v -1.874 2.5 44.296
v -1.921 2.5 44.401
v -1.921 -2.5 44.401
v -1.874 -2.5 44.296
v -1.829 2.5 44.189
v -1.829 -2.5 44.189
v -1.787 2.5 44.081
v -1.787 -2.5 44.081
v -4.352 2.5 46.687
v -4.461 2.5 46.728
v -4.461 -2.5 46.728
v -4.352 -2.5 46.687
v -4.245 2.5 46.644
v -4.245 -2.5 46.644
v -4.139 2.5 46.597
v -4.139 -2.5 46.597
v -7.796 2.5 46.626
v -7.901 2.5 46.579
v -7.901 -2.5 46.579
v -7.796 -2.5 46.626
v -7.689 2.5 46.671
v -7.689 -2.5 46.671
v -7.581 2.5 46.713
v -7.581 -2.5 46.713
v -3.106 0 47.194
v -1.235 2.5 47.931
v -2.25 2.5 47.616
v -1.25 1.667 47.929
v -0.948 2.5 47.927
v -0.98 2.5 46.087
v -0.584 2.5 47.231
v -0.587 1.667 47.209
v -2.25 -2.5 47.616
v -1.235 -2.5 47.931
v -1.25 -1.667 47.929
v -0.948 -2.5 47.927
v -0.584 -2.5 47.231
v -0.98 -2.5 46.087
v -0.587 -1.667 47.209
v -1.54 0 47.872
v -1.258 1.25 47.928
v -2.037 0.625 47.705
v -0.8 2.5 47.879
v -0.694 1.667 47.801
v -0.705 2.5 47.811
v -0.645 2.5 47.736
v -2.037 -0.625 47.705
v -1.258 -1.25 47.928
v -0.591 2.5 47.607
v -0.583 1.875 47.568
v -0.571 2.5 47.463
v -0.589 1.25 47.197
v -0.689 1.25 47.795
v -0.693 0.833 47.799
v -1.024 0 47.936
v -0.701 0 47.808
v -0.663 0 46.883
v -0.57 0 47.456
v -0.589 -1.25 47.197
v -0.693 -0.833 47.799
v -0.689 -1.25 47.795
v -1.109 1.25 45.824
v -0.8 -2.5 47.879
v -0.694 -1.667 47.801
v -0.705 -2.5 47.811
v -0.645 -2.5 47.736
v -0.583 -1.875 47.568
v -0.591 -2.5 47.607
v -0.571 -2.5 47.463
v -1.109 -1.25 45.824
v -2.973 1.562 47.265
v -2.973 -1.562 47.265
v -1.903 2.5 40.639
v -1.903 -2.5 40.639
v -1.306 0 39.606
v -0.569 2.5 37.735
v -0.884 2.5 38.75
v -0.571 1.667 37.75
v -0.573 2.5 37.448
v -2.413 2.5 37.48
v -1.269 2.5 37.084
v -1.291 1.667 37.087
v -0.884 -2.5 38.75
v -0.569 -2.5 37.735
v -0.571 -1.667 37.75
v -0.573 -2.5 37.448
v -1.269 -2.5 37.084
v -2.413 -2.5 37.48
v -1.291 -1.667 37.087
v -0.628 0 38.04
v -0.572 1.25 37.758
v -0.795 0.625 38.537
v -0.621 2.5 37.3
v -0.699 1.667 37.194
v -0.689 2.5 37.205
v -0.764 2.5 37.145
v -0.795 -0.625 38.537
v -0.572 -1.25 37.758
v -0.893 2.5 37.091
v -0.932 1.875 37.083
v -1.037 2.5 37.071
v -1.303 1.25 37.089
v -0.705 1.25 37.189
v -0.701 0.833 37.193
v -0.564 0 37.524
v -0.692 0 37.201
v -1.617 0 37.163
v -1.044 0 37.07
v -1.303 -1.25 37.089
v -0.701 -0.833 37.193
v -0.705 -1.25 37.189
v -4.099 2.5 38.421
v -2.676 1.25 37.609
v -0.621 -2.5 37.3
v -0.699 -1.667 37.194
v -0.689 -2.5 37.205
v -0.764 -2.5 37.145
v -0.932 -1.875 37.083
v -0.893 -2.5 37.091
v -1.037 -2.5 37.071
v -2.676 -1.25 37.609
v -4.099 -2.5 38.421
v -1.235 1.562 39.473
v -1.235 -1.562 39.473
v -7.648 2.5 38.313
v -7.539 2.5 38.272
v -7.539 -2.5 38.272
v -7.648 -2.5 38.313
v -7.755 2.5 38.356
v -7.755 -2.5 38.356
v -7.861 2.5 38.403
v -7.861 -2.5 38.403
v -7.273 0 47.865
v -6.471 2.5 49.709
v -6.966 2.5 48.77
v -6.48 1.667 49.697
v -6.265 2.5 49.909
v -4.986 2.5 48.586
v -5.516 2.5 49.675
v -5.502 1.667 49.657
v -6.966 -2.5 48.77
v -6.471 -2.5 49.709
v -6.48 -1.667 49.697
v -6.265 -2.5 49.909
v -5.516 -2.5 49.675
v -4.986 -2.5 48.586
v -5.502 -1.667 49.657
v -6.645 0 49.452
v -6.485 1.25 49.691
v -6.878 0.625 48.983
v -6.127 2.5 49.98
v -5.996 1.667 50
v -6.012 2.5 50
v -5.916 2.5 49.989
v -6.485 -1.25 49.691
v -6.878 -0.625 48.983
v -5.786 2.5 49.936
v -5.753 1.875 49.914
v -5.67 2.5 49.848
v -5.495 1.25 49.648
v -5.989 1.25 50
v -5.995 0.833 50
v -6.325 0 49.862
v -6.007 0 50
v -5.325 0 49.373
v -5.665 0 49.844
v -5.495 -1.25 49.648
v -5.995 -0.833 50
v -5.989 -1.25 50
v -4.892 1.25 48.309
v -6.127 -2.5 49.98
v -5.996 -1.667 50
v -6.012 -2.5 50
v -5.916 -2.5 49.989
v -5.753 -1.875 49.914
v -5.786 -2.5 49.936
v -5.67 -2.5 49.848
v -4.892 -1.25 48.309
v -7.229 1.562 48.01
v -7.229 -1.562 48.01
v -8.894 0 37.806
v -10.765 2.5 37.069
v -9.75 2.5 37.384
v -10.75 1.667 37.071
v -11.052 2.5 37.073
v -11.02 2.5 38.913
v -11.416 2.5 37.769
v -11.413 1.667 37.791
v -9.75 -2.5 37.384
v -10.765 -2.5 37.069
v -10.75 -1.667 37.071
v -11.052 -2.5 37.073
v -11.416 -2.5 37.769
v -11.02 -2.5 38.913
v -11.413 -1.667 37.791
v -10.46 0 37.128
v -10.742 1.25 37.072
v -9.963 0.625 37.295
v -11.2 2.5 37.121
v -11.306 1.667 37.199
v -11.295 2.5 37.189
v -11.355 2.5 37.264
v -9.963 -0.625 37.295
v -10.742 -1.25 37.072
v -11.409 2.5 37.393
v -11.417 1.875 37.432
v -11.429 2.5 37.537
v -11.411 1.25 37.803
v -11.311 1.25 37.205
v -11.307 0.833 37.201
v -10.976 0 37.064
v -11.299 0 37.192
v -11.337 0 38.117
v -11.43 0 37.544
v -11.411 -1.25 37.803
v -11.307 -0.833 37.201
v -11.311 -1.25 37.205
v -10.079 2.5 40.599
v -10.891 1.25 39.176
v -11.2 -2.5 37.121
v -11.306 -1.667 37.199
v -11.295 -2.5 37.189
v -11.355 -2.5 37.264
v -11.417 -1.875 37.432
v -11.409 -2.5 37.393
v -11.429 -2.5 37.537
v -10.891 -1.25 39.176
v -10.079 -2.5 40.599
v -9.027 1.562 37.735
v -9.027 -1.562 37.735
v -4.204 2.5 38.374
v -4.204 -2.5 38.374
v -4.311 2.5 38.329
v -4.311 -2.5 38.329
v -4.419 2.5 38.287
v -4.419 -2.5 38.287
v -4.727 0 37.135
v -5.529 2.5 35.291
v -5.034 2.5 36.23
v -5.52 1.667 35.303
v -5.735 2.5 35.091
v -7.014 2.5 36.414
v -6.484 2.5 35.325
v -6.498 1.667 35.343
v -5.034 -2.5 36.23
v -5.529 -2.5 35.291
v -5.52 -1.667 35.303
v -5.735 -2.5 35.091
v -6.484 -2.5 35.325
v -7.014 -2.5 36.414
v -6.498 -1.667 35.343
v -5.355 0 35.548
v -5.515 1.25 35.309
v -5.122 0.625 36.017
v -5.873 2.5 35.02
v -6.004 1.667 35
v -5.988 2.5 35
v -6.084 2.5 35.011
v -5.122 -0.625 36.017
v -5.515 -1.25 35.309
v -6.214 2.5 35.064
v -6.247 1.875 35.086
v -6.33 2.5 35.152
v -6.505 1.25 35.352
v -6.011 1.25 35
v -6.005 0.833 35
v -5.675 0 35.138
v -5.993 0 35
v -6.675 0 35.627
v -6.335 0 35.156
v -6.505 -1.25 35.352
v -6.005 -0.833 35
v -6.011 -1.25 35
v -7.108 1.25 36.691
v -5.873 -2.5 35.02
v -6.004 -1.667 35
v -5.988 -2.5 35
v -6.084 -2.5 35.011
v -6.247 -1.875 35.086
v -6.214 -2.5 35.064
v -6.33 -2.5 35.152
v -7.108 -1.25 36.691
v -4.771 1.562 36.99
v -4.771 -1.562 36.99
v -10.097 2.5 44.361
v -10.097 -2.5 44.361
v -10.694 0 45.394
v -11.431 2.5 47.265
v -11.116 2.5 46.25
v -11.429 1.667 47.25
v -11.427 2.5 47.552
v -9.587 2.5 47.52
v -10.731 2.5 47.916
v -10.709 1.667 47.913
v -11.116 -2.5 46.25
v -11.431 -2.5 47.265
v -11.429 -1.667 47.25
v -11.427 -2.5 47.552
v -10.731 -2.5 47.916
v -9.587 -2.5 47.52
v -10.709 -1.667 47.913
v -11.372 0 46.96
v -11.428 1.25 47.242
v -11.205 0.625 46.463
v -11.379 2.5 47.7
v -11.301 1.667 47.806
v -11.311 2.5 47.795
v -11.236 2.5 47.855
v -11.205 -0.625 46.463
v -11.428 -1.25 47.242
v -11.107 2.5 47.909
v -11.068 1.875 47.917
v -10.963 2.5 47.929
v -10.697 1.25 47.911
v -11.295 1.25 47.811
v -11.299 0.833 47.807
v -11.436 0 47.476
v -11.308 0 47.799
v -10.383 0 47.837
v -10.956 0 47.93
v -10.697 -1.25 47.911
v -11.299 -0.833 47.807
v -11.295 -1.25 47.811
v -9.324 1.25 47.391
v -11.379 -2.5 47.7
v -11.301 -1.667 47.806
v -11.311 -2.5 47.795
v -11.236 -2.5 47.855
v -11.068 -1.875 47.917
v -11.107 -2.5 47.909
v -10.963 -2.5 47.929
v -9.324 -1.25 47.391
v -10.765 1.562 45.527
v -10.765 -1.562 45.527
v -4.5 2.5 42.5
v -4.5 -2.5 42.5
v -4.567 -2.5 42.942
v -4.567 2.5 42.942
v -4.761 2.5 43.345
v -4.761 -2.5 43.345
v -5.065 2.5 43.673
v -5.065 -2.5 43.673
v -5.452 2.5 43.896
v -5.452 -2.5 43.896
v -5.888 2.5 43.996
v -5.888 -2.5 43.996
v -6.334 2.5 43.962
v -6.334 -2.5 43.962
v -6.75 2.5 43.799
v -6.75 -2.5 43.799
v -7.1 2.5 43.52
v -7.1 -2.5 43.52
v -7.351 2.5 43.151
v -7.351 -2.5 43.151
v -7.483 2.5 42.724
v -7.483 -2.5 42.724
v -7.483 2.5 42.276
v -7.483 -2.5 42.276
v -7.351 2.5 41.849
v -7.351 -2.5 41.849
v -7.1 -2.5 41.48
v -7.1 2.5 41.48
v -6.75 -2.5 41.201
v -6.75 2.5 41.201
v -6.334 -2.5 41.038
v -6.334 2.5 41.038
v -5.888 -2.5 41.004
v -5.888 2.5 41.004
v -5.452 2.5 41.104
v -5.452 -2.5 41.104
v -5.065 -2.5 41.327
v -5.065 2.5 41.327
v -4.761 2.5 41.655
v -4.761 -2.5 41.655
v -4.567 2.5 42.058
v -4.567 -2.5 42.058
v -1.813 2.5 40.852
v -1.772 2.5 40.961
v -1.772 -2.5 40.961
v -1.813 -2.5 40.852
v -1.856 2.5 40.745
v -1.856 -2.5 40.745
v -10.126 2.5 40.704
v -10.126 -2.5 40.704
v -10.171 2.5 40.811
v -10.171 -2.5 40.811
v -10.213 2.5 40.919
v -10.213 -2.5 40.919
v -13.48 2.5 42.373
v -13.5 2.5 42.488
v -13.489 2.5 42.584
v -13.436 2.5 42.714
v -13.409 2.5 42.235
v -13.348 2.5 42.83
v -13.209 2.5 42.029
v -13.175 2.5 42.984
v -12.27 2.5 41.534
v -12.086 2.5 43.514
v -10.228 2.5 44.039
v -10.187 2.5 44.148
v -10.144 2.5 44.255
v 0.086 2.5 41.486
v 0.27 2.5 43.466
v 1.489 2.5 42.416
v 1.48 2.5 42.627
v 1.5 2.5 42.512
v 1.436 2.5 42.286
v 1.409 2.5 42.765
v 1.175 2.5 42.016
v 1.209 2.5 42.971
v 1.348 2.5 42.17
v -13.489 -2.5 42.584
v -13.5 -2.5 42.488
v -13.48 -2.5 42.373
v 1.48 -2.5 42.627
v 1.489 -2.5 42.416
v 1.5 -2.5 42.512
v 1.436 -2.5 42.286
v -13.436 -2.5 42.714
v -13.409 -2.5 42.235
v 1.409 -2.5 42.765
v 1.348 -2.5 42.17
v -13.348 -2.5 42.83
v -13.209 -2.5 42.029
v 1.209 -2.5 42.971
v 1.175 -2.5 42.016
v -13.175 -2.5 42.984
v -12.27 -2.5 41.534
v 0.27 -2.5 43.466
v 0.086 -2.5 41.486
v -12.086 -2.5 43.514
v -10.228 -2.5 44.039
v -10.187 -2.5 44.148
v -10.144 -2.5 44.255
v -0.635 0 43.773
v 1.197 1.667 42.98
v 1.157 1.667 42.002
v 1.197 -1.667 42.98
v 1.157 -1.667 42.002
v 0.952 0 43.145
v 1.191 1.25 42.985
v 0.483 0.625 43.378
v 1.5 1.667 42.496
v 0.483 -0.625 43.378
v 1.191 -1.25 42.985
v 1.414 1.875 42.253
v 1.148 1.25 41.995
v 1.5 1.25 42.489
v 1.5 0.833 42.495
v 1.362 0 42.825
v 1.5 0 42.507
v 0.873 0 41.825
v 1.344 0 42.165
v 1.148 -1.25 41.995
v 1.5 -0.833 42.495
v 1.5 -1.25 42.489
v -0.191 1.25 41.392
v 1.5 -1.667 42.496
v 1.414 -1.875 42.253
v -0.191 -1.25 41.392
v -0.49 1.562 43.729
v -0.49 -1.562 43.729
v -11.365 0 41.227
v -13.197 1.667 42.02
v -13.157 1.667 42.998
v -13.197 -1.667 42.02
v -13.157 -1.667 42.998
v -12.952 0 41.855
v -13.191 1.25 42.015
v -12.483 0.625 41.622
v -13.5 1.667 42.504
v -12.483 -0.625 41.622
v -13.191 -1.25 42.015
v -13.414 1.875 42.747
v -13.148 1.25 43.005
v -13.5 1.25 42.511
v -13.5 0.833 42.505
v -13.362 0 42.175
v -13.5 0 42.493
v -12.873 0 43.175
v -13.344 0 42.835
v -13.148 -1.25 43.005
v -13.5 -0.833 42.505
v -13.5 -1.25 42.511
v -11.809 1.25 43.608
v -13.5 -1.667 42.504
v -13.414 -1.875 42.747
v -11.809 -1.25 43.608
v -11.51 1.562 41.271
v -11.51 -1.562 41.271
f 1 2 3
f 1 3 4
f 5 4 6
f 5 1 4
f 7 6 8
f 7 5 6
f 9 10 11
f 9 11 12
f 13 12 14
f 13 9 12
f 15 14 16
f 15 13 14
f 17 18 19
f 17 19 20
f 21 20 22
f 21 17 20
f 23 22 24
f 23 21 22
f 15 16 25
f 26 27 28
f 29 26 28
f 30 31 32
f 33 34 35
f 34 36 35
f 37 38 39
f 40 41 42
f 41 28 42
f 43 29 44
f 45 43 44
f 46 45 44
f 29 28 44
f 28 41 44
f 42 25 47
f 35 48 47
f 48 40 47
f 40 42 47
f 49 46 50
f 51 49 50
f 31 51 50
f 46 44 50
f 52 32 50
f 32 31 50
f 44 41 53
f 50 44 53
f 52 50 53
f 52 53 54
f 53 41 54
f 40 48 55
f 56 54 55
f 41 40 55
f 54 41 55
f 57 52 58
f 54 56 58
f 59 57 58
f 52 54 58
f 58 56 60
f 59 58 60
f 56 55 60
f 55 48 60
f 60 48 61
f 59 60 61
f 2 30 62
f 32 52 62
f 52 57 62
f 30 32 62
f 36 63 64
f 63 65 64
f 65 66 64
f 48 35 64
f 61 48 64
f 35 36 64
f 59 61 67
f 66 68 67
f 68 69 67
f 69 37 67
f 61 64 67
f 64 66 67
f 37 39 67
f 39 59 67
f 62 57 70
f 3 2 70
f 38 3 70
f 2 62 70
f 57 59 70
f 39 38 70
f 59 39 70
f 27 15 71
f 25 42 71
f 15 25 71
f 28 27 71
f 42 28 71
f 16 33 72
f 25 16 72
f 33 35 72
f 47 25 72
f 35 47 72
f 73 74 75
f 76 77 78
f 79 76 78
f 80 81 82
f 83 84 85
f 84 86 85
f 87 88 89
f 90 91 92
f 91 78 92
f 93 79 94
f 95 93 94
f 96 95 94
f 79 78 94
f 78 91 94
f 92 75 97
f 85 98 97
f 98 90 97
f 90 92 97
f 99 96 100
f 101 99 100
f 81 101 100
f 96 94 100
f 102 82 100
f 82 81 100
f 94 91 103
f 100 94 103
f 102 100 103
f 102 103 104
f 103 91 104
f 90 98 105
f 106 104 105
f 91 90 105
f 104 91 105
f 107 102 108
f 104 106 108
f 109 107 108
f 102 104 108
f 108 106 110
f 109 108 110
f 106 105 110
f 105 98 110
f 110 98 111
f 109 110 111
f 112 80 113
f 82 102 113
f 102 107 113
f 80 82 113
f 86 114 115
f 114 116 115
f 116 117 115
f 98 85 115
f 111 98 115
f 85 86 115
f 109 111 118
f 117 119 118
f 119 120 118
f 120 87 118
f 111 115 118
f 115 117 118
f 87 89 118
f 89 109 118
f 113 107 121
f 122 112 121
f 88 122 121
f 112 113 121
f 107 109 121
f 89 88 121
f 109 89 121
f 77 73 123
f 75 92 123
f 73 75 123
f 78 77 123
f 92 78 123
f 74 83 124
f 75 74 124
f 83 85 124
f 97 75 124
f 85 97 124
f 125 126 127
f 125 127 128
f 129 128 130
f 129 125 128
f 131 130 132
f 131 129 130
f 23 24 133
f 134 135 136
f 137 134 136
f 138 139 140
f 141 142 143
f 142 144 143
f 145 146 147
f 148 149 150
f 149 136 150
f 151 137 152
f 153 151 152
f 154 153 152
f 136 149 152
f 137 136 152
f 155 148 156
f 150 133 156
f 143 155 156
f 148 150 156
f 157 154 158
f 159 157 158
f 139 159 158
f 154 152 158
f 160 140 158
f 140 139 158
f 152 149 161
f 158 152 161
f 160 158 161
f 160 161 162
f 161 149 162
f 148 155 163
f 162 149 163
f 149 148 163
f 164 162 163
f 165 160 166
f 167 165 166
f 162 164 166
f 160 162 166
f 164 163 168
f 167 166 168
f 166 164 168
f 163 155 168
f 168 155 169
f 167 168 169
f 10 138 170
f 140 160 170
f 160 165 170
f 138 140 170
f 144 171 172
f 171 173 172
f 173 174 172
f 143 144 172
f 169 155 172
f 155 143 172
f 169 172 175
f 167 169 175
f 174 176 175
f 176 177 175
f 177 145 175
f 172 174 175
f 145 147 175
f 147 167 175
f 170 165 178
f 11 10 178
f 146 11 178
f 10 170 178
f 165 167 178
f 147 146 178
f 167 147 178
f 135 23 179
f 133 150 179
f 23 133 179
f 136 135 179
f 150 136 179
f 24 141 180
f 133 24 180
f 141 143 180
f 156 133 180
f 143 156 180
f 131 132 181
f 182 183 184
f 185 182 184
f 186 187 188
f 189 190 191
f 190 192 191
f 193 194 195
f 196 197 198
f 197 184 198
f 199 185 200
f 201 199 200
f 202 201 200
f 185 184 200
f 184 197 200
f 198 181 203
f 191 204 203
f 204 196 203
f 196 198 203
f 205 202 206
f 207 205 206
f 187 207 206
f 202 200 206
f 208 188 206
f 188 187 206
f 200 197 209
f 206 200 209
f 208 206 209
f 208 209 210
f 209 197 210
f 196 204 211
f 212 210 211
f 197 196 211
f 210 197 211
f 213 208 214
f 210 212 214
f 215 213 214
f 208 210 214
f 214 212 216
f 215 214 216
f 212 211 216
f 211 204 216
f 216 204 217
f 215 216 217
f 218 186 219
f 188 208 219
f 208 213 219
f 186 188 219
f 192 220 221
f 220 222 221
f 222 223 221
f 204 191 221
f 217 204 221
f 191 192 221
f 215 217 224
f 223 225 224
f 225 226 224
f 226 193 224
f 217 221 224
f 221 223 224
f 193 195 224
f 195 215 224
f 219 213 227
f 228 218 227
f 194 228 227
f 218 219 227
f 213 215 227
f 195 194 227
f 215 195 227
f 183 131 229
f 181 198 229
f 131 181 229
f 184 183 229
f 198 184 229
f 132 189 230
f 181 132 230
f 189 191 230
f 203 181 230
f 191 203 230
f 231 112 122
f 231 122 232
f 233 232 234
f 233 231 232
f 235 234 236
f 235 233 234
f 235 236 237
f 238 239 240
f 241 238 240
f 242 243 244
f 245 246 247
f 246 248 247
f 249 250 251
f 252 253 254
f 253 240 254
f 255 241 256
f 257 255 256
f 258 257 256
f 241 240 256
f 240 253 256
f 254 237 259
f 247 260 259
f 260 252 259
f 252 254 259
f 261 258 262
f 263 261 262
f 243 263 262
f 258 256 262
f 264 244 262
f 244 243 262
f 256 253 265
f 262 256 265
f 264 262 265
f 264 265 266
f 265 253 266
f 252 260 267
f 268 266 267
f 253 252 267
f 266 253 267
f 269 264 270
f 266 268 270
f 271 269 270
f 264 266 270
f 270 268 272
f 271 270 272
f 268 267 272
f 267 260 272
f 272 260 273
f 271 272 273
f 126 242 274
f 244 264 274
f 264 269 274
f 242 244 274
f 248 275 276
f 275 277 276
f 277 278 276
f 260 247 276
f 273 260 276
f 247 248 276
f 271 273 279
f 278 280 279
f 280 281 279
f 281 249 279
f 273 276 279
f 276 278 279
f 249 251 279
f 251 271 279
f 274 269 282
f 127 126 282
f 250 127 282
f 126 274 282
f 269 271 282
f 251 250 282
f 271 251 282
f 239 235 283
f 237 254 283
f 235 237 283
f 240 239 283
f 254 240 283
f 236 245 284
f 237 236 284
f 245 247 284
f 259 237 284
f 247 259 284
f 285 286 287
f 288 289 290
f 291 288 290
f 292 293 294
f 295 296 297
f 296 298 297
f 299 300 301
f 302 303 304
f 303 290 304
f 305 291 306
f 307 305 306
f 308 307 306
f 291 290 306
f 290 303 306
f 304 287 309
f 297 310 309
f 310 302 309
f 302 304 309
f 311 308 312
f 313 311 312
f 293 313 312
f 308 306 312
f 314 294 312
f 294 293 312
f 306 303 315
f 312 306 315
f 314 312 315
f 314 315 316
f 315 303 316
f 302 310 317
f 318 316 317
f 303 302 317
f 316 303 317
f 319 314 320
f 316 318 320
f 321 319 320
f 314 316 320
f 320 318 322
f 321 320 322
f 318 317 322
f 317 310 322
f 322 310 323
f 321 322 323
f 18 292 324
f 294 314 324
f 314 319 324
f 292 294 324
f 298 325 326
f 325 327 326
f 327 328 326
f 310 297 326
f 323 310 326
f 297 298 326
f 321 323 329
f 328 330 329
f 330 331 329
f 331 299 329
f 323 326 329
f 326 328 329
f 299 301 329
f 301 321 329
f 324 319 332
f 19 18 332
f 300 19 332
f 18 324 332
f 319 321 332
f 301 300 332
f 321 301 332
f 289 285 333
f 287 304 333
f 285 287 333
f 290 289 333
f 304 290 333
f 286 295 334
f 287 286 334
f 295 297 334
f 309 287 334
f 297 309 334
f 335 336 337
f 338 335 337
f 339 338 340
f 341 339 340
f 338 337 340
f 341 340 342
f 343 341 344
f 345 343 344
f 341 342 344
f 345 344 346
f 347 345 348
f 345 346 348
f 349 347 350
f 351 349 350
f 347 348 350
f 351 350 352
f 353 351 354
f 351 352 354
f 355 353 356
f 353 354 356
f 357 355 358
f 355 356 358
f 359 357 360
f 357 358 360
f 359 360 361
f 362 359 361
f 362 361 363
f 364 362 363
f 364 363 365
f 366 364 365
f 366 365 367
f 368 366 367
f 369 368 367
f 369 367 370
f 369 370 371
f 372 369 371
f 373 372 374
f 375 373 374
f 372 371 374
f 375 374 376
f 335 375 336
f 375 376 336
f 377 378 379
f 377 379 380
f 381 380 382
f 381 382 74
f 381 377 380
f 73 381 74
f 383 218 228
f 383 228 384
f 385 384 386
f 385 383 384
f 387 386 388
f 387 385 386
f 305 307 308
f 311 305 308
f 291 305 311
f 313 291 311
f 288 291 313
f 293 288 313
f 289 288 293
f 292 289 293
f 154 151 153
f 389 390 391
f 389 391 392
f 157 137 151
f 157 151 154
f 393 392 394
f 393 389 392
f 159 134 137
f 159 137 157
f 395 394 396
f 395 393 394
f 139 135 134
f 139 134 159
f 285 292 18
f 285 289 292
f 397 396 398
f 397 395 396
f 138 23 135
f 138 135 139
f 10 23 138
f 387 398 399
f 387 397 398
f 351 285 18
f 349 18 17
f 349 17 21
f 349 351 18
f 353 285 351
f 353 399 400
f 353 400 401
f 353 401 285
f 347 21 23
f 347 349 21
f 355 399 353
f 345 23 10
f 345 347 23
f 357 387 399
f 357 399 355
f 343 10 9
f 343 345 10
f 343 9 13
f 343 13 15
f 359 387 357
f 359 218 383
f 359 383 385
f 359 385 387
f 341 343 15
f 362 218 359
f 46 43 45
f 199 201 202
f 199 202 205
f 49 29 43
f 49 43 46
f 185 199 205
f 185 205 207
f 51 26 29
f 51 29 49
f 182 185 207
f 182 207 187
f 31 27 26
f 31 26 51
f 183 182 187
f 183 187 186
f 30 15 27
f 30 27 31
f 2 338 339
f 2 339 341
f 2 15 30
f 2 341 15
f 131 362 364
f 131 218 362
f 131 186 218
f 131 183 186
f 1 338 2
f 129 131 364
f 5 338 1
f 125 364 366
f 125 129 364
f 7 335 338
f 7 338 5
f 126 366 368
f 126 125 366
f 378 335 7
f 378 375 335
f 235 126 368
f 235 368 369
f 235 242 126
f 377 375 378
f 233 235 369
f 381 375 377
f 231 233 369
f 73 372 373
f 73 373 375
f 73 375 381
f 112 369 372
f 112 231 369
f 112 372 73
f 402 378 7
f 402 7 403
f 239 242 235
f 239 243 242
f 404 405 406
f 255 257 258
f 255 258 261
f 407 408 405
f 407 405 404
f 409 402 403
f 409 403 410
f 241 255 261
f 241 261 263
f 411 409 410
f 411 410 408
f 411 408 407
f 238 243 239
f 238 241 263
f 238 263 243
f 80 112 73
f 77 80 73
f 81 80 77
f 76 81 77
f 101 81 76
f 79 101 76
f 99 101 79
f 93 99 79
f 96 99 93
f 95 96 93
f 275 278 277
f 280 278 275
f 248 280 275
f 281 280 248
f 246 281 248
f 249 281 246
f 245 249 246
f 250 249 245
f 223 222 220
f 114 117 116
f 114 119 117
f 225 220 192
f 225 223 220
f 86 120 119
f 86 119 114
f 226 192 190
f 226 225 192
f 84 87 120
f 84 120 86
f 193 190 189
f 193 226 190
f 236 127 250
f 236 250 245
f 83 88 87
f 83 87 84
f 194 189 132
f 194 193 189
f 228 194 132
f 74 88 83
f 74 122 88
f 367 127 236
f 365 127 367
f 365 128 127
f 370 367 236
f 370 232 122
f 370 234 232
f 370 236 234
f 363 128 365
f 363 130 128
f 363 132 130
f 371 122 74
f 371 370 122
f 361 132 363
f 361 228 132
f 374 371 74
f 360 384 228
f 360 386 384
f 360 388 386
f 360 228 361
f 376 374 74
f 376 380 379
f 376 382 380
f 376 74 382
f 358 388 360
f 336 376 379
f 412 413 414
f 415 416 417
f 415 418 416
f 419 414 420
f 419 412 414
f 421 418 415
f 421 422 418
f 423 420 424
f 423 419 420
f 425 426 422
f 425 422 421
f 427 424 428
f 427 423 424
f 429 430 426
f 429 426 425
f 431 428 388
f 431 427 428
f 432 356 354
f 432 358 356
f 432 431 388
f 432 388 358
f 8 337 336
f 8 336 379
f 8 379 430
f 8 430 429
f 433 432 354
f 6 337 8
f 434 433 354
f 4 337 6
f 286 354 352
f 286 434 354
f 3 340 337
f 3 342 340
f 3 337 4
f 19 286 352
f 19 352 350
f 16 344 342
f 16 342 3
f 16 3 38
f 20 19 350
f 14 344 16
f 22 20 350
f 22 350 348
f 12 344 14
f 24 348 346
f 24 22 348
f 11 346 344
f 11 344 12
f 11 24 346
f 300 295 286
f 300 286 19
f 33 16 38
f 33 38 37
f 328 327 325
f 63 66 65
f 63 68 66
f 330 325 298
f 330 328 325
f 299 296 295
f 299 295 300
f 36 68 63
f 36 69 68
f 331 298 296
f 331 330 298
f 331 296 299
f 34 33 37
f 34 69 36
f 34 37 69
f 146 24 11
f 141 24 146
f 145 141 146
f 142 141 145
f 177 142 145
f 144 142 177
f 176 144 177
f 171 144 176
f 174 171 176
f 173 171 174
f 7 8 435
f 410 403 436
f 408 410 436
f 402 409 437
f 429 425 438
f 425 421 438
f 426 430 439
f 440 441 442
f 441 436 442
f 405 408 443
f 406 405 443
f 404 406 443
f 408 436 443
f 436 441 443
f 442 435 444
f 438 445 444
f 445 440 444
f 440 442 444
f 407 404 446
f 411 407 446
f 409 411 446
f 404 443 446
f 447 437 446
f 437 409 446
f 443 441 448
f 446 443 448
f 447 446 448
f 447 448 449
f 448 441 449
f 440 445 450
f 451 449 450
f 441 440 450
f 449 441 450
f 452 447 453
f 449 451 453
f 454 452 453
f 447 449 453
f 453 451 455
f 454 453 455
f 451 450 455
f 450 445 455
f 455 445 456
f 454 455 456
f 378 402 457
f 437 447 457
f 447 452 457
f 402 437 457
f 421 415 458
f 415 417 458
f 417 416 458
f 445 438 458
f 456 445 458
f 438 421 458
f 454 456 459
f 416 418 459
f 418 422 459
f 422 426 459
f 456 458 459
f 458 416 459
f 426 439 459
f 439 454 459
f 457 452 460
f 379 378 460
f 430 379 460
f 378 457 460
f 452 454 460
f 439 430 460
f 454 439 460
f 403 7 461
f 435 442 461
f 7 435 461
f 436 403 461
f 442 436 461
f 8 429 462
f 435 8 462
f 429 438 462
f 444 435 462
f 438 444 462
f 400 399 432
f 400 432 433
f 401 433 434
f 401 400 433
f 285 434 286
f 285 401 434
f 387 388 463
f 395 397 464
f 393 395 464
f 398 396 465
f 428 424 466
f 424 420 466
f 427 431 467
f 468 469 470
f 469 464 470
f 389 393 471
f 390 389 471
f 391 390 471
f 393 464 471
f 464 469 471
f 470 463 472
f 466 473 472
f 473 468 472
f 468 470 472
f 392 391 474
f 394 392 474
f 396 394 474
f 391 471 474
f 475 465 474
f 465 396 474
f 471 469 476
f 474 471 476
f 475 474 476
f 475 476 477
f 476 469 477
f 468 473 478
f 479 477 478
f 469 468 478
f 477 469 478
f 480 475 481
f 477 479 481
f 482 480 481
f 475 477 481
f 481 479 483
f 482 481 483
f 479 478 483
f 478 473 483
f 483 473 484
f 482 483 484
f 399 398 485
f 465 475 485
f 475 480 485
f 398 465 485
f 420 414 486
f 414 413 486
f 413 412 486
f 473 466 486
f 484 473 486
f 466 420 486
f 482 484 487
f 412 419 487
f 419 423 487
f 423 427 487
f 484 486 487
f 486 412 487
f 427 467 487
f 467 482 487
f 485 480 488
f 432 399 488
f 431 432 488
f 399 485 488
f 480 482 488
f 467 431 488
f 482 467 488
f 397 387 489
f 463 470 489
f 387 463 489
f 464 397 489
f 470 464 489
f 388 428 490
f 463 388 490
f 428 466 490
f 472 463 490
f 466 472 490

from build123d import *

# Parameters (mm, degrees)
SKETCH3_R           = 4.5
BOSS_EXTRUDE2_DEPTH = 2.5
BOSS_EXTRUDE3_DEPTH = 5
CIRPATTERN1_COUNT   = 8
SKETCH7_R           = 1.5
CUT_EXTRUDE1_DEPTH  = 5


with BuildPart() as part:
    # Sketch3 → Boss-Extrude2 (new body, symmetric)
    with BuildSketch(Plane(origin=(0, 0, 0), x_dir=(1, 0, 0), z_dir=(0, 1, 0))):
        with Locations((-6, -42.5)):
            Circle(SKETCH3_R)
    extrude(amount=BOSS_EXTRUDE2_DEPTH, both=True)

    # Sketch5 → Boss-Extrude3 (add, through all)
    with BuildSketch(Plane.XZ.offset(2.5)):
        with BuildLine():
            Line((-7.58091961, 46.713157152), (-4.460558472, 46.728489066))
            add(Edge.make_bspline(
                [(-7.58091961, 46.713157152), (-5.992864636, 53.279234709), (-4.460558472, 46.728489066)],
                knots=[0, 0, 0, 1, 1, 1], degree=2))
        make_face()
    boss_extrude3 = extrude(amount=-BOSS_EXTRUDE3_DEPTH)

    # CirPattern1: Boss-Extrude3 ×8 about axis
    cirpattern1_axis = Axis((-6, -2.5, 42.5), (0, 1, 0))
    for i in range(1, CIRPATTERN1_COUNT):
        add(boss_extrude3.rotate(cirpattern1_axis, i * 360 / CIRPATTERN1_COUNT))

    # Sketch7 → Cut-Extrude1 (cut)
    with BuildSketch(Plane.XZ.offset(2.5)):
        with Locations((-6, 42.5)):
            Circle(SKETCH7_R)
    extrude(amount=-CUT_EXTRUDE1_DEPTH, mode=Mode.SUBTRACT)


solid = part.part
